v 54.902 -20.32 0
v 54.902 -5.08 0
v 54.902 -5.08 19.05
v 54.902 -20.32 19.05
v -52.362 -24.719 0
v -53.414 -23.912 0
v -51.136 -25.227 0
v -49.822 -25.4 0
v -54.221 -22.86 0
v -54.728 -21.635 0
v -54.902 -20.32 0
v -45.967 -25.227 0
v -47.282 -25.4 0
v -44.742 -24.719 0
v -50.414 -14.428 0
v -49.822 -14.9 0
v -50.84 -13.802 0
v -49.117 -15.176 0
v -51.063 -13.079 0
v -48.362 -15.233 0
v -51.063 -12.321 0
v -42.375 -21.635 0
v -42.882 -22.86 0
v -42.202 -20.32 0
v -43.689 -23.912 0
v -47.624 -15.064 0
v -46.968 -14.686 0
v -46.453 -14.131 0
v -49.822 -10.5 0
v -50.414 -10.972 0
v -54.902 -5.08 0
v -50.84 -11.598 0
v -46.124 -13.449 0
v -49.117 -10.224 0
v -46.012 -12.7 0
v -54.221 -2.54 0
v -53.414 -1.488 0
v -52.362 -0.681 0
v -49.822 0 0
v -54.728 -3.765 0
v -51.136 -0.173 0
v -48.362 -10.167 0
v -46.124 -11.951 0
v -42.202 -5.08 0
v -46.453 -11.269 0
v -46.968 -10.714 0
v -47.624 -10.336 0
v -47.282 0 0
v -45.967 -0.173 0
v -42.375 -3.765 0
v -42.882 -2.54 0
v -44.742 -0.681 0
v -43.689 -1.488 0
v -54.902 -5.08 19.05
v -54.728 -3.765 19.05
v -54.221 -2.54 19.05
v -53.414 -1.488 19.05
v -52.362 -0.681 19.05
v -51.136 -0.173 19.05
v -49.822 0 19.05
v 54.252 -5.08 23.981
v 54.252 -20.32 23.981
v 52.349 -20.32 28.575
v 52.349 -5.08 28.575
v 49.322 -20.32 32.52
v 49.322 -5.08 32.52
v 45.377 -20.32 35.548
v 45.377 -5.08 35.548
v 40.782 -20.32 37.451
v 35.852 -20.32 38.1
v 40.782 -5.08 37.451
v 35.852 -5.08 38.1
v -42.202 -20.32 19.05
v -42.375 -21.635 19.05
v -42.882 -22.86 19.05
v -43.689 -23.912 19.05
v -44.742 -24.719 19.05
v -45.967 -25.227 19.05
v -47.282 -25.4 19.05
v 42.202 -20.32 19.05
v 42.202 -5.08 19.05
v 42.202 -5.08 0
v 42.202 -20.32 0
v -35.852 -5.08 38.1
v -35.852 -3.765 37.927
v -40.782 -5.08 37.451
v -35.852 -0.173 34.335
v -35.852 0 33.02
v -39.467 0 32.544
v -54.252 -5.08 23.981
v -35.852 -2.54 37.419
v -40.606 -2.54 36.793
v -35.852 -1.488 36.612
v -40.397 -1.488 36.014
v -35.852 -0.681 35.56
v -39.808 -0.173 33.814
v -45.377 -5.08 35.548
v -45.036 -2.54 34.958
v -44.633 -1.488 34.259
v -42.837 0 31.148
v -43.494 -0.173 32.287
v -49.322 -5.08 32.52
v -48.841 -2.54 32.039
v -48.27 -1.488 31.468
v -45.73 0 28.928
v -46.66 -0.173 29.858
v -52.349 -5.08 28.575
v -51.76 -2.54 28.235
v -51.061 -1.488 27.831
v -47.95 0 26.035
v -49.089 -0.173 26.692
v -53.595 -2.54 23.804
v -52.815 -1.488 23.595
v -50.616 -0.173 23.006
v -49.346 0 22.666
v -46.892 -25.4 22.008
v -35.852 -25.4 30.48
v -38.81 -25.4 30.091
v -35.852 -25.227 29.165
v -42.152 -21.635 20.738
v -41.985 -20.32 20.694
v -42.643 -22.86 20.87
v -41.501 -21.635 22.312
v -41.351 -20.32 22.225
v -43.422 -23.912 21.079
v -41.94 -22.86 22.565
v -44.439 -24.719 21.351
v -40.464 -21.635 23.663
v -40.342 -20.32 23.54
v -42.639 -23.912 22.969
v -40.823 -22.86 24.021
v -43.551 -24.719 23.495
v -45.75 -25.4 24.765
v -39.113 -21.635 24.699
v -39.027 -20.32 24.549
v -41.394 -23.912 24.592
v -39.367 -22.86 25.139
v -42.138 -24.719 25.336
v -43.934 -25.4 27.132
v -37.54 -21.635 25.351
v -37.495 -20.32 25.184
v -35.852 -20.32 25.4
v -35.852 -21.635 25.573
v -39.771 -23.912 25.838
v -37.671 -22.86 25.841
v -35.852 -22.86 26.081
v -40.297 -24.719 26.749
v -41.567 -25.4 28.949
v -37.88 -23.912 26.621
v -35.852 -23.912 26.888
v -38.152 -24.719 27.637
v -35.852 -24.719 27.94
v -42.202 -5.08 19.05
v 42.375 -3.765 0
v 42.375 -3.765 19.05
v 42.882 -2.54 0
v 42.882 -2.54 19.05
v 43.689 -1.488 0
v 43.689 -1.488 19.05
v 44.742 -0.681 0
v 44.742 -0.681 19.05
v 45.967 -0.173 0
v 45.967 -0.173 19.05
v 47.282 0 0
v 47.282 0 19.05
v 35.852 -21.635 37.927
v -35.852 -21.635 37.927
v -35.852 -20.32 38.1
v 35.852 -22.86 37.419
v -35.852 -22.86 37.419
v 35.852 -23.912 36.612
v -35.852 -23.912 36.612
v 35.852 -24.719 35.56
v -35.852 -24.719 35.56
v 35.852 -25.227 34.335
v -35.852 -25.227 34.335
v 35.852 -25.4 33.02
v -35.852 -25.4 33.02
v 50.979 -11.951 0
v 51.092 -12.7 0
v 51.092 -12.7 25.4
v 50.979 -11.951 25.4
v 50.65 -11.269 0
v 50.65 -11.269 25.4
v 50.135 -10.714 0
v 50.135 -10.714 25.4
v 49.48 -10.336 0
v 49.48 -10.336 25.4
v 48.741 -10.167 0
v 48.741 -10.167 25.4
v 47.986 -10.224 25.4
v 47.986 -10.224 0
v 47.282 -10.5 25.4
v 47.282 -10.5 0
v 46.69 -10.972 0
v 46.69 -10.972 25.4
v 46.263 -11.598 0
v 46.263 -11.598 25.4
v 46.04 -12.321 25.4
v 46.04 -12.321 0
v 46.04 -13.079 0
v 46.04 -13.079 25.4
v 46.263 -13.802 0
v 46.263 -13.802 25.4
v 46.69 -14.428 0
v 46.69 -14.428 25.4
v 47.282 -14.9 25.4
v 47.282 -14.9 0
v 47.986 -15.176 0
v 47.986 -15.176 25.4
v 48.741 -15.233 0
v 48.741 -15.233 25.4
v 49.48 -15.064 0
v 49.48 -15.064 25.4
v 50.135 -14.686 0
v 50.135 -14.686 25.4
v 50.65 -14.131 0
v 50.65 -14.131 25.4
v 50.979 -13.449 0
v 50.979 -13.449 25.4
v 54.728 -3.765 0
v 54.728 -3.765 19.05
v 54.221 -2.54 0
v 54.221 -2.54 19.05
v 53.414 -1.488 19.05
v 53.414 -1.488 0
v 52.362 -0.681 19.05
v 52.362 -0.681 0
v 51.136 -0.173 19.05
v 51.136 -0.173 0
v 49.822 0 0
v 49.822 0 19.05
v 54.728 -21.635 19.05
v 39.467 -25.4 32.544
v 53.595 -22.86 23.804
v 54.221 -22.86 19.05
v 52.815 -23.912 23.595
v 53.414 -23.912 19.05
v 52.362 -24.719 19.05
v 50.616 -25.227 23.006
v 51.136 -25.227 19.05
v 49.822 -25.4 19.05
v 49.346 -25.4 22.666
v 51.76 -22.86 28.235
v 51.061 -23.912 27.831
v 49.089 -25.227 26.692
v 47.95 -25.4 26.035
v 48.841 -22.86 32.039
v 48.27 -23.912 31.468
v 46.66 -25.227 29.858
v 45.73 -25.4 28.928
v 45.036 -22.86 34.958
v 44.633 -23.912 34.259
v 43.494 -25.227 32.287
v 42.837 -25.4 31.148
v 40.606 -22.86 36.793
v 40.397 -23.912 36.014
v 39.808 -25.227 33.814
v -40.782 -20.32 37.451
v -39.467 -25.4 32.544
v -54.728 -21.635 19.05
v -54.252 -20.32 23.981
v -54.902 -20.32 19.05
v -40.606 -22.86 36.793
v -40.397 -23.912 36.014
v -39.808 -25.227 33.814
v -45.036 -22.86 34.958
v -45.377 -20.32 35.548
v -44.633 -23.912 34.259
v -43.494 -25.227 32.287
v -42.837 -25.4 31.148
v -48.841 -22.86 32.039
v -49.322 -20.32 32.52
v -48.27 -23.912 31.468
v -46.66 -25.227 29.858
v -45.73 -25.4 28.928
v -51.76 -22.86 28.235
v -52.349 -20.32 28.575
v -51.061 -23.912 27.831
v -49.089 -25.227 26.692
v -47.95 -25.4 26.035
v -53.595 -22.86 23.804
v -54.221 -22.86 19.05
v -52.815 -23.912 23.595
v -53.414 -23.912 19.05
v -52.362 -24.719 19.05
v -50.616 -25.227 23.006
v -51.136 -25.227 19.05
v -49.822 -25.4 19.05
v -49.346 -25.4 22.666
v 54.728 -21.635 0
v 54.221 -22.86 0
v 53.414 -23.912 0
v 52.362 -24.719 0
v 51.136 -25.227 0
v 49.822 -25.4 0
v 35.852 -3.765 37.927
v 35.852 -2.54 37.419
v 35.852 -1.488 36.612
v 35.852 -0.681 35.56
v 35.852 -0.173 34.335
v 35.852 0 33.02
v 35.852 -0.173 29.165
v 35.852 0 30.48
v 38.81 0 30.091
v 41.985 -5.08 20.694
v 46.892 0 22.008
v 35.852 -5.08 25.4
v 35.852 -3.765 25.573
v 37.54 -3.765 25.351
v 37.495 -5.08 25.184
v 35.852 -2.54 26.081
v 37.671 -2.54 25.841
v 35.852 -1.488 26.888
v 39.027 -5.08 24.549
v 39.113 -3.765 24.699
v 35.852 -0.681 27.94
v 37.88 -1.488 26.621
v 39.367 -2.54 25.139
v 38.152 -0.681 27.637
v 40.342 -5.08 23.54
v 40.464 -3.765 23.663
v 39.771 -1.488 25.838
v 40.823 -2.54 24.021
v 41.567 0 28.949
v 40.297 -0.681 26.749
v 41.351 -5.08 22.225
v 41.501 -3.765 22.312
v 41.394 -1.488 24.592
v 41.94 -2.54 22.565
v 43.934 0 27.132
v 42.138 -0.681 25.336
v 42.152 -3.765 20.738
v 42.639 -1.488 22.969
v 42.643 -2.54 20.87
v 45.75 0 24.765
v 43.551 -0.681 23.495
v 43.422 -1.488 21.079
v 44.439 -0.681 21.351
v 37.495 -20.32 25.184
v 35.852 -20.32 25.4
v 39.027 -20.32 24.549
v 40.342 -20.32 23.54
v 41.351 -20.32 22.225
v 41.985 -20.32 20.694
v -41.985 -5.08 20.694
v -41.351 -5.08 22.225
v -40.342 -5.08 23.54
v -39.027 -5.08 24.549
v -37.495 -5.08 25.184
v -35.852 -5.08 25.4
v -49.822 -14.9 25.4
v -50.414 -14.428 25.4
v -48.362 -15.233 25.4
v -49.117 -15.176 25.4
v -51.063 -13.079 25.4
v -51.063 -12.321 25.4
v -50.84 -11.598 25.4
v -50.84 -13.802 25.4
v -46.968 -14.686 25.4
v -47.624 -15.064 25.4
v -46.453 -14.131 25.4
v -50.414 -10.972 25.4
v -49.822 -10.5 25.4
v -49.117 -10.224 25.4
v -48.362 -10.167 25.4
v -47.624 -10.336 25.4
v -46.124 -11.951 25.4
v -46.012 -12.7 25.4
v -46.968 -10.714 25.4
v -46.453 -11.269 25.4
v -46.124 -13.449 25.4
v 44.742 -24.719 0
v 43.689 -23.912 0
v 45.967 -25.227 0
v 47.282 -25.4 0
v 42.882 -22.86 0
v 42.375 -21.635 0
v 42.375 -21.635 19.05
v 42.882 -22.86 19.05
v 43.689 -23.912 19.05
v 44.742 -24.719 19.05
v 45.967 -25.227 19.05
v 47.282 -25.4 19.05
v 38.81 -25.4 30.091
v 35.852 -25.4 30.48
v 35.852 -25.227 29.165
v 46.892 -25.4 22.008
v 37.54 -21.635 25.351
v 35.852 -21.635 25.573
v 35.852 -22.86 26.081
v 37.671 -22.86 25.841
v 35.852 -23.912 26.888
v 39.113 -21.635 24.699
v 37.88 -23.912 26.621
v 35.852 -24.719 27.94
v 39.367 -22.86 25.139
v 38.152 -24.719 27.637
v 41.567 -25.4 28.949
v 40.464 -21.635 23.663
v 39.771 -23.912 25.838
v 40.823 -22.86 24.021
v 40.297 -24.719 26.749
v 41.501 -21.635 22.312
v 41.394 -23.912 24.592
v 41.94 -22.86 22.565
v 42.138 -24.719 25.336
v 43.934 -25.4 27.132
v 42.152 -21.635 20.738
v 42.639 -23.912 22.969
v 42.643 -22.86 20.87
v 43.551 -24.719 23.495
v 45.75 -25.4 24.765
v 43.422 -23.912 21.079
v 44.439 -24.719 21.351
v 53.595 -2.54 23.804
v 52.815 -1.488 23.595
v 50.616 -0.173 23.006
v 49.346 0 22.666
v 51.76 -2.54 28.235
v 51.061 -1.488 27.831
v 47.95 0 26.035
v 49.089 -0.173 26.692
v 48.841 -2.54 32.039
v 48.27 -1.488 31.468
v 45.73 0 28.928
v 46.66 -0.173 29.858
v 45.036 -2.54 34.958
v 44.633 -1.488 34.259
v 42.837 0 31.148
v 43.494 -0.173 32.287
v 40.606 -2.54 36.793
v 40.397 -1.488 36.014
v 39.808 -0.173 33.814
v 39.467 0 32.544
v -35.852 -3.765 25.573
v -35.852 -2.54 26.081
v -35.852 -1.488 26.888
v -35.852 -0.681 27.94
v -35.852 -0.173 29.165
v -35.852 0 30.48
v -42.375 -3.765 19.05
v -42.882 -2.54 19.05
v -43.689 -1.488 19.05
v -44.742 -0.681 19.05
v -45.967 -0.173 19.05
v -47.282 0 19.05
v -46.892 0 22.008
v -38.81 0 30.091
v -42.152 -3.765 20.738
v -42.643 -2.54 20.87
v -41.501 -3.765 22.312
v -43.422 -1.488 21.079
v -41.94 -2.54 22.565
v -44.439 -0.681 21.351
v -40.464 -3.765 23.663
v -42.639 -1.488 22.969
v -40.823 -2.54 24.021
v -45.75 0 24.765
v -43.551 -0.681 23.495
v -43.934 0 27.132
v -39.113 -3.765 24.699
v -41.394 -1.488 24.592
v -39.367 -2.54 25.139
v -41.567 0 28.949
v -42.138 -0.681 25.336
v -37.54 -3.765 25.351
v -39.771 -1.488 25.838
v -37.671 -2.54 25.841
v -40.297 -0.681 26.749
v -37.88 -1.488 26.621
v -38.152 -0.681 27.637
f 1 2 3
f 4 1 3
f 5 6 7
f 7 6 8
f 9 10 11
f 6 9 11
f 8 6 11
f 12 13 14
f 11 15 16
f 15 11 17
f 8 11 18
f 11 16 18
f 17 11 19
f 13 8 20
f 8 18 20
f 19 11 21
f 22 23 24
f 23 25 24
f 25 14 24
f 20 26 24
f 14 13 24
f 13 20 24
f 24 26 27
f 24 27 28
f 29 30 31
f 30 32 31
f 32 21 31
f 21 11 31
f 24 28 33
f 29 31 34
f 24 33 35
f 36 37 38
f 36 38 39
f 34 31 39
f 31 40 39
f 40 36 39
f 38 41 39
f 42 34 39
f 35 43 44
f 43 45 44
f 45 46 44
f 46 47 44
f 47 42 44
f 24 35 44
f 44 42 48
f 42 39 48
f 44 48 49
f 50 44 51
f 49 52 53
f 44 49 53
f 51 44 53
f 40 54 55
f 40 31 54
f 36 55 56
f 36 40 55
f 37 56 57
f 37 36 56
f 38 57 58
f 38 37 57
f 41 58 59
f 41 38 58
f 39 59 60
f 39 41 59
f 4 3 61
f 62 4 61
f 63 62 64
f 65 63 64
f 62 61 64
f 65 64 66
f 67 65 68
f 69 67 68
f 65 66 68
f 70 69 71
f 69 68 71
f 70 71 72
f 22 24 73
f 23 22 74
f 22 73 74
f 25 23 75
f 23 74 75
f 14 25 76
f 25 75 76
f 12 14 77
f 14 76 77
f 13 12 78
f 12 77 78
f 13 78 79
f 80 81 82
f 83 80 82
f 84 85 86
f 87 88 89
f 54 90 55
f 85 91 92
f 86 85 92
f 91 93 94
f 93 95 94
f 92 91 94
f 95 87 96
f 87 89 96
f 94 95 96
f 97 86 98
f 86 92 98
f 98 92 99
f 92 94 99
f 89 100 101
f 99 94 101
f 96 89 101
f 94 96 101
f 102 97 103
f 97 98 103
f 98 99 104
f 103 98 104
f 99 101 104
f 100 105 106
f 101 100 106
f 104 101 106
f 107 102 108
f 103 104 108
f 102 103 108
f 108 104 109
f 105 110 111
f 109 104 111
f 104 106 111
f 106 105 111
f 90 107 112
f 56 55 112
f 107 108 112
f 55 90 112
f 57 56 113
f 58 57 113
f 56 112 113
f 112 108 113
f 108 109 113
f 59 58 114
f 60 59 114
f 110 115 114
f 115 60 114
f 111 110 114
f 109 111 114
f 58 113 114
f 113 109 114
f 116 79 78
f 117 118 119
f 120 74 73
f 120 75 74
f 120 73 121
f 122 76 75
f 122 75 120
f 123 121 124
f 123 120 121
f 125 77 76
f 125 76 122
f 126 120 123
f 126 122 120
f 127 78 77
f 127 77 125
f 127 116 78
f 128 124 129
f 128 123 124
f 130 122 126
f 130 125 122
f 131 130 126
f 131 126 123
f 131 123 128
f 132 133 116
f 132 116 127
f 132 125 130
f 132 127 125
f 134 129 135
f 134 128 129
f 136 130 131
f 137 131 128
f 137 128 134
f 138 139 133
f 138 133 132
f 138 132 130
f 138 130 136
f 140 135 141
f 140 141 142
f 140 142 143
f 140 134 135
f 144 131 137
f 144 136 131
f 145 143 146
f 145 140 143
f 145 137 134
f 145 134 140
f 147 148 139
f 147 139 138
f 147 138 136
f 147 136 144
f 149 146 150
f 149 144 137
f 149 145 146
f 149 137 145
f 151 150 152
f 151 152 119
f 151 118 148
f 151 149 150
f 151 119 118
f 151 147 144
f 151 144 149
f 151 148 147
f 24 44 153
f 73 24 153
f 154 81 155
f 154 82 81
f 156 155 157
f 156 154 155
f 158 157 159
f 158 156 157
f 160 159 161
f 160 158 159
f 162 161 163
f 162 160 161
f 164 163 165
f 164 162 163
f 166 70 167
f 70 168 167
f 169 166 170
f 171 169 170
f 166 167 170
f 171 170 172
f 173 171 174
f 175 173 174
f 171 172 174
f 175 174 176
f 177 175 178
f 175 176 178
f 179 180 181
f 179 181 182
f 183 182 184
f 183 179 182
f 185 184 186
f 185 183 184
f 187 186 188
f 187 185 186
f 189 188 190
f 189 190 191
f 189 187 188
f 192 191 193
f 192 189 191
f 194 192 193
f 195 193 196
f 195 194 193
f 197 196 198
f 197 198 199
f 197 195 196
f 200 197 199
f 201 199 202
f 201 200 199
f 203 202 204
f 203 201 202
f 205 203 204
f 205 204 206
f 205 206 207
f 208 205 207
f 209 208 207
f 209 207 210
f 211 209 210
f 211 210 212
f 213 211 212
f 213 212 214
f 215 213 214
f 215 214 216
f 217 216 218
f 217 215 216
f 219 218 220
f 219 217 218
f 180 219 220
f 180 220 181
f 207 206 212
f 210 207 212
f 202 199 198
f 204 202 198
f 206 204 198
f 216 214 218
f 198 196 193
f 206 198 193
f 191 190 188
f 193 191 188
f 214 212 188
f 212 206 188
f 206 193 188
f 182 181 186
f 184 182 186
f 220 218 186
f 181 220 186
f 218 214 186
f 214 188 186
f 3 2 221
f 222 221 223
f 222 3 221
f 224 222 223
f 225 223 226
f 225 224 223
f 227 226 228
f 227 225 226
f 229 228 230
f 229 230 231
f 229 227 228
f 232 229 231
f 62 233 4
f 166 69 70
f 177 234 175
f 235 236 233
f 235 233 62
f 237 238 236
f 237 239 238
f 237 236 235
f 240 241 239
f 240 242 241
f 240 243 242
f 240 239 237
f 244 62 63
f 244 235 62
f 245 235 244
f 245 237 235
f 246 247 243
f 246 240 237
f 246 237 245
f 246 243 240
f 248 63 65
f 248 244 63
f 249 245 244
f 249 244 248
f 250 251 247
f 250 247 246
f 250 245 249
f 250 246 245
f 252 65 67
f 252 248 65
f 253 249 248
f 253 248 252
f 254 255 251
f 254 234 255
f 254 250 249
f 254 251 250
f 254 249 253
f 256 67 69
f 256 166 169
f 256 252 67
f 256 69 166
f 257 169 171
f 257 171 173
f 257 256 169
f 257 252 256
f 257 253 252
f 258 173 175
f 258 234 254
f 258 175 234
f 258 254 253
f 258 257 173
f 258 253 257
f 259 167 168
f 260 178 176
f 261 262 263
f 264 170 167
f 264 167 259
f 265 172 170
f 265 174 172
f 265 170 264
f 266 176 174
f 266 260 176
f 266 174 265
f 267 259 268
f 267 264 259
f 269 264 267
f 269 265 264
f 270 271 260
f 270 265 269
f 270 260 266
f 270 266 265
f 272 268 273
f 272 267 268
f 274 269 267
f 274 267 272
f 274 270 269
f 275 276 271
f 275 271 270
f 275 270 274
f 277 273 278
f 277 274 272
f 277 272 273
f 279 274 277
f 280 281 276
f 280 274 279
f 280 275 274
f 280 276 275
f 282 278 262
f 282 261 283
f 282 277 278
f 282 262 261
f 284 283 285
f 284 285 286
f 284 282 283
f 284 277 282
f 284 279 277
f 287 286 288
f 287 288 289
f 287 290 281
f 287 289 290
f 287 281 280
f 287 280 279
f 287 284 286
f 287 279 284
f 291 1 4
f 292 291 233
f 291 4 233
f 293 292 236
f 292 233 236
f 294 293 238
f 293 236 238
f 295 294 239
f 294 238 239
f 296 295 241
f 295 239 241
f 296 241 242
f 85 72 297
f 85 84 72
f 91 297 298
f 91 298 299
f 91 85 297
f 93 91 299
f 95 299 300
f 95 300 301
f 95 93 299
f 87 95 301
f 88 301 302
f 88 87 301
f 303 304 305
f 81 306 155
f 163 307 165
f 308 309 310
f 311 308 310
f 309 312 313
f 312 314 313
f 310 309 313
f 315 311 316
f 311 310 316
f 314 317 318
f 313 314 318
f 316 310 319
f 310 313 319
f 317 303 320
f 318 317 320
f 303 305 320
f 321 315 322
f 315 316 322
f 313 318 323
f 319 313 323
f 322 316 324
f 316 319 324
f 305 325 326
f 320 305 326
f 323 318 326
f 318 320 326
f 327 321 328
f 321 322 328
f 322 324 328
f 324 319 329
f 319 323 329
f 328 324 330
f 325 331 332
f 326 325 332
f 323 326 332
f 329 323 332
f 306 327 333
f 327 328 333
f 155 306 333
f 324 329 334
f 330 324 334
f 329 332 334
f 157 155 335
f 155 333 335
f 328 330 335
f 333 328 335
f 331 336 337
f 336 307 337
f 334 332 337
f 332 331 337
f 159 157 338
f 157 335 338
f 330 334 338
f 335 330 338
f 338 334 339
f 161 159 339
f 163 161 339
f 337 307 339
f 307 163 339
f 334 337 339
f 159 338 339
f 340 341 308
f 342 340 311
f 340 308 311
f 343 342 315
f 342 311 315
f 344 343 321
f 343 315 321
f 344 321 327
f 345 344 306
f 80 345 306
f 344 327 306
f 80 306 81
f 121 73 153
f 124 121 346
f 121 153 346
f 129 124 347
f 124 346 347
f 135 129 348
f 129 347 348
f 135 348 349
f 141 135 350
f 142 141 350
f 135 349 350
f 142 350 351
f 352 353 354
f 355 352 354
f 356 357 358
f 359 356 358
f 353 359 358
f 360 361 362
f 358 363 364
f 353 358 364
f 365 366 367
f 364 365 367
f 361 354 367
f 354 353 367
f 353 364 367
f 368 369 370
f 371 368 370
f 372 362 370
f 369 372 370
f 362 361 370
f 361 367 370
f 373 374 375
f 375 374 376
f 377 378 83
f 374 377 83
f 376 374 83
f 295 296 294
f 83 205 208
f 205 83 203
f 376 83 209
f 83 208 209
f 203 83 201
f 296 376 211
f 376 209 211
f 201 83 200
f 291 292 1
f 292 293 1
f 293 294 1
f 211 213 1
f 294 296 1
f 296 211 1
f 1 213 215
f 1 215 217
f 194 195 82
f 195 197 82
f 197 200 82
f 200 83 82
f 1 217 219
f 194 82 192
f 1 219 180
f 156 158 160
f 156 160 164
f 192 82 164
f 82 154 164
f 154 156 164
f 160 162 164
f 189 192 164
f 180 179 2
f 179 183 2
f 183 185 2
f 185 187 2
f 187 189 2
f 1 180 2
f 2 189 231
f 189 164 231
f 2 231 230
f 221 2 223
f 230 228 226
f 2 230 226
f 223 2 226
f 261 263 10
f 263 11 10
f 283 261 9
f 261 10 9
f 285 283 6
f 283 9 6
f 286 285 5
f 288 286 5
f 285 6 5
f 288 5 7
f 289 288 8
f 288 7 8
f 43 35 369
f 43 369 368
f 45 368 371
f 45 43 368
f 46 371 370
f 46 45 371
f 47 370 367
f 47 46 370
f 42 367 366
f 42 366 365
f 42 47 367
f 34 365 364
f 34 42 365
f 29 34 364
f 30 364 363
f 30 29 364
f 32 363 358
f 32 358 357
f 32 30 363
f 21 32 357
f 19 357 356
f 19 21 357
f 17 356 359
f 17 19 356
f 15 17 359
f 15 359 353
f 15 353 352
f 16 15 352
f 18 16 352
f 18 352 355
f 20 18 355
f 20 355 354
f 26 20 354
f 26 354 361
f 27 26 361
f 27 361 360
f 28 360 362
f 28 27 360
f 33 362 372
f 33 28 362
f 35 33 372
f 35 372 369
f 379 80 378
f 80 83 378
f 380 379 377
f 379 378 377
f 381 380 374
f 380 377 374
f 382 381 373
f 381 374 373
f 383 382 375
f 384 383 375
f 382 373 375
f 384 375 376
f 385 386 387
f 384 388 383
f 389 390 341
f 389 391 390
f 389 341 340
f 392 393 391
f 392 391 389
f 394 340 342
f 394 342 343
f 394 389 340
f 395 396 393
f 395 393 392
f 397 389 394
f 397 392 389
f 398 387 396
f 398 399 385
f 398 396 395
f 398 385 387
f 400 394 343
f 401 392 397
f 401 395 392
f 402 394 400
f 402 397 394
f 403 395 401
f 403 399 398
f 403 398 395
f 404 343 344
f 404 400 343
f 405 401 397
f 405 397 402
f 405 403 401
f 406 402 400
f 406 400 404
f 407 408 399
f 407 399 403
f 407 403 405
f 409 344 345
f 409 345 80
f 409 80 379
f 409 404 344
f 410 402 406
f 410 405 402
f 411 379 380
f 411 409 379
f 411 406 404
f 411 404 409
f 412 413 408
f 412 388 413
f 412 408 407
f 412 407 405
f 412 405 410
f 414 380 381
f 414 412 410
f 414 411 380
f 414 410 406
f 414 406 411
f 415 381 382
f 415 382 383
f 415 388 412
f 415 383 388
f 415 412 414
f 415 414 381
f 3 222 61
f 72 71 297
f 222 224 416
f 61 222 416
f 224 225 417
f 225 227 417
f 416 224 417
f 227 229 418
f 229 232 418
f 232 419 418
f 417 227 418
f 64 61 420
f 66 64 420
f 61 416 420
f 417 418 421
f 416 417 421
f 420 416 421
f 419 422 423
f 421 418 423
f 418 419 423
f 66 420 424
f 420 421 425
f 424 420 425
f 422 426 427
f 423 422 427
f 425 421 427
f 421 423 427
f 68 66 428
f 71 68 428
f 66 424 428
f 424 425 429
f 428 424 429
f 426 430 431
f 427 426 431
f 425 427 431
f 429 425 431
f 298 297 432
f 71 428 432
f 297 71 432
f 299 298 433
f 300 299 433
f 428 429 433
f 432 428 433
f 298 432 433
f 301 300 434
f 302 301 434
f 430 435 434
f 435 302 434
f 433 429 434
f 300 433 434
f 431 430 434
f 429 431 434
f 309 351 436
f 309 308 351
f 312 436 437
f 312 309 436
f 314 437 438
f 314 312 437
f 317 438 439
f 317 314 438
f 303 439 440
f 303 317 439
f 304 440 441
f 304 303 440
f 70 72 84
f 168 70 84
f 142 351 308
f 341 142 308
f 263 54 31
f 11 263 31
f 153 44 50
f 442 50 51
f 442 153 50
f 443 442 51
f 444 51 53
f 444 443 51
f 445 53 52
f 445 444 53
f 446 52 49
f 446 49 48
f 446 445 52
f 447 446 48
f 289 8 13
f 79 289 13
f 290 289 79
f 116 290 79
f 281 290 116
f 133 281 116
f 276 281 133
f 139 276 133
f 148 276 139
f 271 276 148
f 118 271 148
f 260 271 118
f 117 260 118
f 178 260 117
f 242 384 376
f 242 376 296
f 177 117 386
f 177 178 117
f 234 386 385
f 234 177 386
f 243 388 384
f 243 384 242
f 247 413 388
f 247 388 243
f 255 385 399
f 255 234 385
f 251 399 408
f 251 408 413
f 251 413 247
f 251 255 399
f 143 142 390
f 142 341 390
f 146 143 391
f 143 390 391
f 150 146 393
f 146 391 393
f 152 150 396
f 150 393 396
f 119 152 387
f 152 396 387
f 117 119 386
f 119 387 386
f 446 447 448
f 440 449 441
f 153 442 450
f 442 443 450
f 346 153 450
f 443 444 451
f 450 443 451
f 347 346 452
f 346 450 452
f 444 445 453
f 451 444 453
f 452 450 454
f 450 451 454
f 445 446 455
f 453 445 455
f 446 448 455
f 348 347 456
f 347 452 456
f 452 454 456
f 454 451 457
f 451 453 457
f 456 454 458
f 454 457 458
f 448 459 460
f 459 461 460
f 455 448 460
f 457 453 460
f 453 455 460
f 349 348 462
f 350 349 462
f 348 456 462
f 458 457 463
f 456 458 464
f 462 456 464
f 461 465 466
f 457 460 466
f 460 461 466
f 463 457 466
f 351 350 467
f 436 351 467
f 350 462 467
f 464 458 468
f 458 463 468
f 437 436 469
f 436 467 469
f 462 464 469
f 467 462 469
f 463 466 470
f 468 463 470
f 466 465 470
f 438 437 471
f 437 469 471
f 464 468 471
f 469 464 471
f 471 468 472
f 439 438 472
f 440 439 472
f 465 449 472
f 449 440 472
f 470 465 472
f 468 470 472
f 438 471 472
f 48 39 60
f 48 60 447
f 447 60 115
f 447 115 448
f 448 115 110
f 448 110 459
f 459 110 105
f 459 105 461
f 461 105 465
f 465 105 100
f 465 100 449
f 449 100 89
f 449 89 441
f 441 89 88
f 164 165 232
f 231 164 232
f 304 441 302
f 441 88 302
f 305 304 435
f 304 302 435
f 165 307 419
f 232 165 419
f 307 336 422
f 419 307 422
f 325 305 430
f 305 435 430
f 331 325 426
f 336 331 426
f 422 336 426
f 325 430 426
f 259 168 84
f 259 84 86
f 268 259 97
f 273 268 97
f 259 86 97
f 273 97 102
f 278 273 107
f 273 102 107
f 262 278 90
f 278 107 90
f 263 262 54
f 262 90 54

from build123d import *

# Parameters (mm, degrees)
F1_DEPTH = 25.4
F2_R     = 5.08
F3_R     = 2.54
F4_DEPTH = 25.4


with BuildPart() as f1:
    # F0 (on Front) → F1 (new body)
    with BuildSketch(Plane.XZ):
        with BuildLine():
            ThreePointArc((54.901558, 19.05), (49.321942, 32.520384), (35.851558, 38.1))
            Line((35.851558, 38.1), (-35.851558, 38.1))
            ThreePointArc((-35.851558, 38.1), (-49.321942, 32.520384), (-54.901558, 19.05))
            Line((-54.901558, 19.05), (-54.901558, 0))
            Line((-54.901558, 0), (-42.201558, 0))
            Line((-42.201558, 0), (-42.201558, 19.05))
            ThreePointArc((-42.201558, 19.05), (-40.341686, 23.540128), (-35.851558, 25.4))
            Line((-35.851558, 25.4), (35.851558, 25.4))
            ThreePointArc((35.851558, 25.4), (40.341686, 23.540128), (42.201558, 19.05))
            Line((42.201558, 19.05), (42.201558, 0))
            Line((42.201558, 0), (54.901558, 0))
            Line((54.901558, 0), (54.901558, 19.05))
        make_face()
    extrude(amount=F1_DEPTH)

    # F2
    f2_edges = [f1.edges().sort_by_distance(p)[0] for p in [
        (0, -25.4, 38.1),
        (0, 0, 38.1),
        (0, -25.4, 25.4),
        (0, 0, 25.4),
    ]]
    fillet(f2_edges, radius=F2_R)

    # F3 (on Top) → F4 (cut)
    with BuildSketch(Plane.XY):
        with Locations((-48.551558, -12.7)):
            Circle(F3_R)
        with Locations((48.551558, -12.7)):
            Circle(F3_R)
    extrude(amount=F4_DEPTH, mode=Mode.SUBTRACT)


solid = f1.part
